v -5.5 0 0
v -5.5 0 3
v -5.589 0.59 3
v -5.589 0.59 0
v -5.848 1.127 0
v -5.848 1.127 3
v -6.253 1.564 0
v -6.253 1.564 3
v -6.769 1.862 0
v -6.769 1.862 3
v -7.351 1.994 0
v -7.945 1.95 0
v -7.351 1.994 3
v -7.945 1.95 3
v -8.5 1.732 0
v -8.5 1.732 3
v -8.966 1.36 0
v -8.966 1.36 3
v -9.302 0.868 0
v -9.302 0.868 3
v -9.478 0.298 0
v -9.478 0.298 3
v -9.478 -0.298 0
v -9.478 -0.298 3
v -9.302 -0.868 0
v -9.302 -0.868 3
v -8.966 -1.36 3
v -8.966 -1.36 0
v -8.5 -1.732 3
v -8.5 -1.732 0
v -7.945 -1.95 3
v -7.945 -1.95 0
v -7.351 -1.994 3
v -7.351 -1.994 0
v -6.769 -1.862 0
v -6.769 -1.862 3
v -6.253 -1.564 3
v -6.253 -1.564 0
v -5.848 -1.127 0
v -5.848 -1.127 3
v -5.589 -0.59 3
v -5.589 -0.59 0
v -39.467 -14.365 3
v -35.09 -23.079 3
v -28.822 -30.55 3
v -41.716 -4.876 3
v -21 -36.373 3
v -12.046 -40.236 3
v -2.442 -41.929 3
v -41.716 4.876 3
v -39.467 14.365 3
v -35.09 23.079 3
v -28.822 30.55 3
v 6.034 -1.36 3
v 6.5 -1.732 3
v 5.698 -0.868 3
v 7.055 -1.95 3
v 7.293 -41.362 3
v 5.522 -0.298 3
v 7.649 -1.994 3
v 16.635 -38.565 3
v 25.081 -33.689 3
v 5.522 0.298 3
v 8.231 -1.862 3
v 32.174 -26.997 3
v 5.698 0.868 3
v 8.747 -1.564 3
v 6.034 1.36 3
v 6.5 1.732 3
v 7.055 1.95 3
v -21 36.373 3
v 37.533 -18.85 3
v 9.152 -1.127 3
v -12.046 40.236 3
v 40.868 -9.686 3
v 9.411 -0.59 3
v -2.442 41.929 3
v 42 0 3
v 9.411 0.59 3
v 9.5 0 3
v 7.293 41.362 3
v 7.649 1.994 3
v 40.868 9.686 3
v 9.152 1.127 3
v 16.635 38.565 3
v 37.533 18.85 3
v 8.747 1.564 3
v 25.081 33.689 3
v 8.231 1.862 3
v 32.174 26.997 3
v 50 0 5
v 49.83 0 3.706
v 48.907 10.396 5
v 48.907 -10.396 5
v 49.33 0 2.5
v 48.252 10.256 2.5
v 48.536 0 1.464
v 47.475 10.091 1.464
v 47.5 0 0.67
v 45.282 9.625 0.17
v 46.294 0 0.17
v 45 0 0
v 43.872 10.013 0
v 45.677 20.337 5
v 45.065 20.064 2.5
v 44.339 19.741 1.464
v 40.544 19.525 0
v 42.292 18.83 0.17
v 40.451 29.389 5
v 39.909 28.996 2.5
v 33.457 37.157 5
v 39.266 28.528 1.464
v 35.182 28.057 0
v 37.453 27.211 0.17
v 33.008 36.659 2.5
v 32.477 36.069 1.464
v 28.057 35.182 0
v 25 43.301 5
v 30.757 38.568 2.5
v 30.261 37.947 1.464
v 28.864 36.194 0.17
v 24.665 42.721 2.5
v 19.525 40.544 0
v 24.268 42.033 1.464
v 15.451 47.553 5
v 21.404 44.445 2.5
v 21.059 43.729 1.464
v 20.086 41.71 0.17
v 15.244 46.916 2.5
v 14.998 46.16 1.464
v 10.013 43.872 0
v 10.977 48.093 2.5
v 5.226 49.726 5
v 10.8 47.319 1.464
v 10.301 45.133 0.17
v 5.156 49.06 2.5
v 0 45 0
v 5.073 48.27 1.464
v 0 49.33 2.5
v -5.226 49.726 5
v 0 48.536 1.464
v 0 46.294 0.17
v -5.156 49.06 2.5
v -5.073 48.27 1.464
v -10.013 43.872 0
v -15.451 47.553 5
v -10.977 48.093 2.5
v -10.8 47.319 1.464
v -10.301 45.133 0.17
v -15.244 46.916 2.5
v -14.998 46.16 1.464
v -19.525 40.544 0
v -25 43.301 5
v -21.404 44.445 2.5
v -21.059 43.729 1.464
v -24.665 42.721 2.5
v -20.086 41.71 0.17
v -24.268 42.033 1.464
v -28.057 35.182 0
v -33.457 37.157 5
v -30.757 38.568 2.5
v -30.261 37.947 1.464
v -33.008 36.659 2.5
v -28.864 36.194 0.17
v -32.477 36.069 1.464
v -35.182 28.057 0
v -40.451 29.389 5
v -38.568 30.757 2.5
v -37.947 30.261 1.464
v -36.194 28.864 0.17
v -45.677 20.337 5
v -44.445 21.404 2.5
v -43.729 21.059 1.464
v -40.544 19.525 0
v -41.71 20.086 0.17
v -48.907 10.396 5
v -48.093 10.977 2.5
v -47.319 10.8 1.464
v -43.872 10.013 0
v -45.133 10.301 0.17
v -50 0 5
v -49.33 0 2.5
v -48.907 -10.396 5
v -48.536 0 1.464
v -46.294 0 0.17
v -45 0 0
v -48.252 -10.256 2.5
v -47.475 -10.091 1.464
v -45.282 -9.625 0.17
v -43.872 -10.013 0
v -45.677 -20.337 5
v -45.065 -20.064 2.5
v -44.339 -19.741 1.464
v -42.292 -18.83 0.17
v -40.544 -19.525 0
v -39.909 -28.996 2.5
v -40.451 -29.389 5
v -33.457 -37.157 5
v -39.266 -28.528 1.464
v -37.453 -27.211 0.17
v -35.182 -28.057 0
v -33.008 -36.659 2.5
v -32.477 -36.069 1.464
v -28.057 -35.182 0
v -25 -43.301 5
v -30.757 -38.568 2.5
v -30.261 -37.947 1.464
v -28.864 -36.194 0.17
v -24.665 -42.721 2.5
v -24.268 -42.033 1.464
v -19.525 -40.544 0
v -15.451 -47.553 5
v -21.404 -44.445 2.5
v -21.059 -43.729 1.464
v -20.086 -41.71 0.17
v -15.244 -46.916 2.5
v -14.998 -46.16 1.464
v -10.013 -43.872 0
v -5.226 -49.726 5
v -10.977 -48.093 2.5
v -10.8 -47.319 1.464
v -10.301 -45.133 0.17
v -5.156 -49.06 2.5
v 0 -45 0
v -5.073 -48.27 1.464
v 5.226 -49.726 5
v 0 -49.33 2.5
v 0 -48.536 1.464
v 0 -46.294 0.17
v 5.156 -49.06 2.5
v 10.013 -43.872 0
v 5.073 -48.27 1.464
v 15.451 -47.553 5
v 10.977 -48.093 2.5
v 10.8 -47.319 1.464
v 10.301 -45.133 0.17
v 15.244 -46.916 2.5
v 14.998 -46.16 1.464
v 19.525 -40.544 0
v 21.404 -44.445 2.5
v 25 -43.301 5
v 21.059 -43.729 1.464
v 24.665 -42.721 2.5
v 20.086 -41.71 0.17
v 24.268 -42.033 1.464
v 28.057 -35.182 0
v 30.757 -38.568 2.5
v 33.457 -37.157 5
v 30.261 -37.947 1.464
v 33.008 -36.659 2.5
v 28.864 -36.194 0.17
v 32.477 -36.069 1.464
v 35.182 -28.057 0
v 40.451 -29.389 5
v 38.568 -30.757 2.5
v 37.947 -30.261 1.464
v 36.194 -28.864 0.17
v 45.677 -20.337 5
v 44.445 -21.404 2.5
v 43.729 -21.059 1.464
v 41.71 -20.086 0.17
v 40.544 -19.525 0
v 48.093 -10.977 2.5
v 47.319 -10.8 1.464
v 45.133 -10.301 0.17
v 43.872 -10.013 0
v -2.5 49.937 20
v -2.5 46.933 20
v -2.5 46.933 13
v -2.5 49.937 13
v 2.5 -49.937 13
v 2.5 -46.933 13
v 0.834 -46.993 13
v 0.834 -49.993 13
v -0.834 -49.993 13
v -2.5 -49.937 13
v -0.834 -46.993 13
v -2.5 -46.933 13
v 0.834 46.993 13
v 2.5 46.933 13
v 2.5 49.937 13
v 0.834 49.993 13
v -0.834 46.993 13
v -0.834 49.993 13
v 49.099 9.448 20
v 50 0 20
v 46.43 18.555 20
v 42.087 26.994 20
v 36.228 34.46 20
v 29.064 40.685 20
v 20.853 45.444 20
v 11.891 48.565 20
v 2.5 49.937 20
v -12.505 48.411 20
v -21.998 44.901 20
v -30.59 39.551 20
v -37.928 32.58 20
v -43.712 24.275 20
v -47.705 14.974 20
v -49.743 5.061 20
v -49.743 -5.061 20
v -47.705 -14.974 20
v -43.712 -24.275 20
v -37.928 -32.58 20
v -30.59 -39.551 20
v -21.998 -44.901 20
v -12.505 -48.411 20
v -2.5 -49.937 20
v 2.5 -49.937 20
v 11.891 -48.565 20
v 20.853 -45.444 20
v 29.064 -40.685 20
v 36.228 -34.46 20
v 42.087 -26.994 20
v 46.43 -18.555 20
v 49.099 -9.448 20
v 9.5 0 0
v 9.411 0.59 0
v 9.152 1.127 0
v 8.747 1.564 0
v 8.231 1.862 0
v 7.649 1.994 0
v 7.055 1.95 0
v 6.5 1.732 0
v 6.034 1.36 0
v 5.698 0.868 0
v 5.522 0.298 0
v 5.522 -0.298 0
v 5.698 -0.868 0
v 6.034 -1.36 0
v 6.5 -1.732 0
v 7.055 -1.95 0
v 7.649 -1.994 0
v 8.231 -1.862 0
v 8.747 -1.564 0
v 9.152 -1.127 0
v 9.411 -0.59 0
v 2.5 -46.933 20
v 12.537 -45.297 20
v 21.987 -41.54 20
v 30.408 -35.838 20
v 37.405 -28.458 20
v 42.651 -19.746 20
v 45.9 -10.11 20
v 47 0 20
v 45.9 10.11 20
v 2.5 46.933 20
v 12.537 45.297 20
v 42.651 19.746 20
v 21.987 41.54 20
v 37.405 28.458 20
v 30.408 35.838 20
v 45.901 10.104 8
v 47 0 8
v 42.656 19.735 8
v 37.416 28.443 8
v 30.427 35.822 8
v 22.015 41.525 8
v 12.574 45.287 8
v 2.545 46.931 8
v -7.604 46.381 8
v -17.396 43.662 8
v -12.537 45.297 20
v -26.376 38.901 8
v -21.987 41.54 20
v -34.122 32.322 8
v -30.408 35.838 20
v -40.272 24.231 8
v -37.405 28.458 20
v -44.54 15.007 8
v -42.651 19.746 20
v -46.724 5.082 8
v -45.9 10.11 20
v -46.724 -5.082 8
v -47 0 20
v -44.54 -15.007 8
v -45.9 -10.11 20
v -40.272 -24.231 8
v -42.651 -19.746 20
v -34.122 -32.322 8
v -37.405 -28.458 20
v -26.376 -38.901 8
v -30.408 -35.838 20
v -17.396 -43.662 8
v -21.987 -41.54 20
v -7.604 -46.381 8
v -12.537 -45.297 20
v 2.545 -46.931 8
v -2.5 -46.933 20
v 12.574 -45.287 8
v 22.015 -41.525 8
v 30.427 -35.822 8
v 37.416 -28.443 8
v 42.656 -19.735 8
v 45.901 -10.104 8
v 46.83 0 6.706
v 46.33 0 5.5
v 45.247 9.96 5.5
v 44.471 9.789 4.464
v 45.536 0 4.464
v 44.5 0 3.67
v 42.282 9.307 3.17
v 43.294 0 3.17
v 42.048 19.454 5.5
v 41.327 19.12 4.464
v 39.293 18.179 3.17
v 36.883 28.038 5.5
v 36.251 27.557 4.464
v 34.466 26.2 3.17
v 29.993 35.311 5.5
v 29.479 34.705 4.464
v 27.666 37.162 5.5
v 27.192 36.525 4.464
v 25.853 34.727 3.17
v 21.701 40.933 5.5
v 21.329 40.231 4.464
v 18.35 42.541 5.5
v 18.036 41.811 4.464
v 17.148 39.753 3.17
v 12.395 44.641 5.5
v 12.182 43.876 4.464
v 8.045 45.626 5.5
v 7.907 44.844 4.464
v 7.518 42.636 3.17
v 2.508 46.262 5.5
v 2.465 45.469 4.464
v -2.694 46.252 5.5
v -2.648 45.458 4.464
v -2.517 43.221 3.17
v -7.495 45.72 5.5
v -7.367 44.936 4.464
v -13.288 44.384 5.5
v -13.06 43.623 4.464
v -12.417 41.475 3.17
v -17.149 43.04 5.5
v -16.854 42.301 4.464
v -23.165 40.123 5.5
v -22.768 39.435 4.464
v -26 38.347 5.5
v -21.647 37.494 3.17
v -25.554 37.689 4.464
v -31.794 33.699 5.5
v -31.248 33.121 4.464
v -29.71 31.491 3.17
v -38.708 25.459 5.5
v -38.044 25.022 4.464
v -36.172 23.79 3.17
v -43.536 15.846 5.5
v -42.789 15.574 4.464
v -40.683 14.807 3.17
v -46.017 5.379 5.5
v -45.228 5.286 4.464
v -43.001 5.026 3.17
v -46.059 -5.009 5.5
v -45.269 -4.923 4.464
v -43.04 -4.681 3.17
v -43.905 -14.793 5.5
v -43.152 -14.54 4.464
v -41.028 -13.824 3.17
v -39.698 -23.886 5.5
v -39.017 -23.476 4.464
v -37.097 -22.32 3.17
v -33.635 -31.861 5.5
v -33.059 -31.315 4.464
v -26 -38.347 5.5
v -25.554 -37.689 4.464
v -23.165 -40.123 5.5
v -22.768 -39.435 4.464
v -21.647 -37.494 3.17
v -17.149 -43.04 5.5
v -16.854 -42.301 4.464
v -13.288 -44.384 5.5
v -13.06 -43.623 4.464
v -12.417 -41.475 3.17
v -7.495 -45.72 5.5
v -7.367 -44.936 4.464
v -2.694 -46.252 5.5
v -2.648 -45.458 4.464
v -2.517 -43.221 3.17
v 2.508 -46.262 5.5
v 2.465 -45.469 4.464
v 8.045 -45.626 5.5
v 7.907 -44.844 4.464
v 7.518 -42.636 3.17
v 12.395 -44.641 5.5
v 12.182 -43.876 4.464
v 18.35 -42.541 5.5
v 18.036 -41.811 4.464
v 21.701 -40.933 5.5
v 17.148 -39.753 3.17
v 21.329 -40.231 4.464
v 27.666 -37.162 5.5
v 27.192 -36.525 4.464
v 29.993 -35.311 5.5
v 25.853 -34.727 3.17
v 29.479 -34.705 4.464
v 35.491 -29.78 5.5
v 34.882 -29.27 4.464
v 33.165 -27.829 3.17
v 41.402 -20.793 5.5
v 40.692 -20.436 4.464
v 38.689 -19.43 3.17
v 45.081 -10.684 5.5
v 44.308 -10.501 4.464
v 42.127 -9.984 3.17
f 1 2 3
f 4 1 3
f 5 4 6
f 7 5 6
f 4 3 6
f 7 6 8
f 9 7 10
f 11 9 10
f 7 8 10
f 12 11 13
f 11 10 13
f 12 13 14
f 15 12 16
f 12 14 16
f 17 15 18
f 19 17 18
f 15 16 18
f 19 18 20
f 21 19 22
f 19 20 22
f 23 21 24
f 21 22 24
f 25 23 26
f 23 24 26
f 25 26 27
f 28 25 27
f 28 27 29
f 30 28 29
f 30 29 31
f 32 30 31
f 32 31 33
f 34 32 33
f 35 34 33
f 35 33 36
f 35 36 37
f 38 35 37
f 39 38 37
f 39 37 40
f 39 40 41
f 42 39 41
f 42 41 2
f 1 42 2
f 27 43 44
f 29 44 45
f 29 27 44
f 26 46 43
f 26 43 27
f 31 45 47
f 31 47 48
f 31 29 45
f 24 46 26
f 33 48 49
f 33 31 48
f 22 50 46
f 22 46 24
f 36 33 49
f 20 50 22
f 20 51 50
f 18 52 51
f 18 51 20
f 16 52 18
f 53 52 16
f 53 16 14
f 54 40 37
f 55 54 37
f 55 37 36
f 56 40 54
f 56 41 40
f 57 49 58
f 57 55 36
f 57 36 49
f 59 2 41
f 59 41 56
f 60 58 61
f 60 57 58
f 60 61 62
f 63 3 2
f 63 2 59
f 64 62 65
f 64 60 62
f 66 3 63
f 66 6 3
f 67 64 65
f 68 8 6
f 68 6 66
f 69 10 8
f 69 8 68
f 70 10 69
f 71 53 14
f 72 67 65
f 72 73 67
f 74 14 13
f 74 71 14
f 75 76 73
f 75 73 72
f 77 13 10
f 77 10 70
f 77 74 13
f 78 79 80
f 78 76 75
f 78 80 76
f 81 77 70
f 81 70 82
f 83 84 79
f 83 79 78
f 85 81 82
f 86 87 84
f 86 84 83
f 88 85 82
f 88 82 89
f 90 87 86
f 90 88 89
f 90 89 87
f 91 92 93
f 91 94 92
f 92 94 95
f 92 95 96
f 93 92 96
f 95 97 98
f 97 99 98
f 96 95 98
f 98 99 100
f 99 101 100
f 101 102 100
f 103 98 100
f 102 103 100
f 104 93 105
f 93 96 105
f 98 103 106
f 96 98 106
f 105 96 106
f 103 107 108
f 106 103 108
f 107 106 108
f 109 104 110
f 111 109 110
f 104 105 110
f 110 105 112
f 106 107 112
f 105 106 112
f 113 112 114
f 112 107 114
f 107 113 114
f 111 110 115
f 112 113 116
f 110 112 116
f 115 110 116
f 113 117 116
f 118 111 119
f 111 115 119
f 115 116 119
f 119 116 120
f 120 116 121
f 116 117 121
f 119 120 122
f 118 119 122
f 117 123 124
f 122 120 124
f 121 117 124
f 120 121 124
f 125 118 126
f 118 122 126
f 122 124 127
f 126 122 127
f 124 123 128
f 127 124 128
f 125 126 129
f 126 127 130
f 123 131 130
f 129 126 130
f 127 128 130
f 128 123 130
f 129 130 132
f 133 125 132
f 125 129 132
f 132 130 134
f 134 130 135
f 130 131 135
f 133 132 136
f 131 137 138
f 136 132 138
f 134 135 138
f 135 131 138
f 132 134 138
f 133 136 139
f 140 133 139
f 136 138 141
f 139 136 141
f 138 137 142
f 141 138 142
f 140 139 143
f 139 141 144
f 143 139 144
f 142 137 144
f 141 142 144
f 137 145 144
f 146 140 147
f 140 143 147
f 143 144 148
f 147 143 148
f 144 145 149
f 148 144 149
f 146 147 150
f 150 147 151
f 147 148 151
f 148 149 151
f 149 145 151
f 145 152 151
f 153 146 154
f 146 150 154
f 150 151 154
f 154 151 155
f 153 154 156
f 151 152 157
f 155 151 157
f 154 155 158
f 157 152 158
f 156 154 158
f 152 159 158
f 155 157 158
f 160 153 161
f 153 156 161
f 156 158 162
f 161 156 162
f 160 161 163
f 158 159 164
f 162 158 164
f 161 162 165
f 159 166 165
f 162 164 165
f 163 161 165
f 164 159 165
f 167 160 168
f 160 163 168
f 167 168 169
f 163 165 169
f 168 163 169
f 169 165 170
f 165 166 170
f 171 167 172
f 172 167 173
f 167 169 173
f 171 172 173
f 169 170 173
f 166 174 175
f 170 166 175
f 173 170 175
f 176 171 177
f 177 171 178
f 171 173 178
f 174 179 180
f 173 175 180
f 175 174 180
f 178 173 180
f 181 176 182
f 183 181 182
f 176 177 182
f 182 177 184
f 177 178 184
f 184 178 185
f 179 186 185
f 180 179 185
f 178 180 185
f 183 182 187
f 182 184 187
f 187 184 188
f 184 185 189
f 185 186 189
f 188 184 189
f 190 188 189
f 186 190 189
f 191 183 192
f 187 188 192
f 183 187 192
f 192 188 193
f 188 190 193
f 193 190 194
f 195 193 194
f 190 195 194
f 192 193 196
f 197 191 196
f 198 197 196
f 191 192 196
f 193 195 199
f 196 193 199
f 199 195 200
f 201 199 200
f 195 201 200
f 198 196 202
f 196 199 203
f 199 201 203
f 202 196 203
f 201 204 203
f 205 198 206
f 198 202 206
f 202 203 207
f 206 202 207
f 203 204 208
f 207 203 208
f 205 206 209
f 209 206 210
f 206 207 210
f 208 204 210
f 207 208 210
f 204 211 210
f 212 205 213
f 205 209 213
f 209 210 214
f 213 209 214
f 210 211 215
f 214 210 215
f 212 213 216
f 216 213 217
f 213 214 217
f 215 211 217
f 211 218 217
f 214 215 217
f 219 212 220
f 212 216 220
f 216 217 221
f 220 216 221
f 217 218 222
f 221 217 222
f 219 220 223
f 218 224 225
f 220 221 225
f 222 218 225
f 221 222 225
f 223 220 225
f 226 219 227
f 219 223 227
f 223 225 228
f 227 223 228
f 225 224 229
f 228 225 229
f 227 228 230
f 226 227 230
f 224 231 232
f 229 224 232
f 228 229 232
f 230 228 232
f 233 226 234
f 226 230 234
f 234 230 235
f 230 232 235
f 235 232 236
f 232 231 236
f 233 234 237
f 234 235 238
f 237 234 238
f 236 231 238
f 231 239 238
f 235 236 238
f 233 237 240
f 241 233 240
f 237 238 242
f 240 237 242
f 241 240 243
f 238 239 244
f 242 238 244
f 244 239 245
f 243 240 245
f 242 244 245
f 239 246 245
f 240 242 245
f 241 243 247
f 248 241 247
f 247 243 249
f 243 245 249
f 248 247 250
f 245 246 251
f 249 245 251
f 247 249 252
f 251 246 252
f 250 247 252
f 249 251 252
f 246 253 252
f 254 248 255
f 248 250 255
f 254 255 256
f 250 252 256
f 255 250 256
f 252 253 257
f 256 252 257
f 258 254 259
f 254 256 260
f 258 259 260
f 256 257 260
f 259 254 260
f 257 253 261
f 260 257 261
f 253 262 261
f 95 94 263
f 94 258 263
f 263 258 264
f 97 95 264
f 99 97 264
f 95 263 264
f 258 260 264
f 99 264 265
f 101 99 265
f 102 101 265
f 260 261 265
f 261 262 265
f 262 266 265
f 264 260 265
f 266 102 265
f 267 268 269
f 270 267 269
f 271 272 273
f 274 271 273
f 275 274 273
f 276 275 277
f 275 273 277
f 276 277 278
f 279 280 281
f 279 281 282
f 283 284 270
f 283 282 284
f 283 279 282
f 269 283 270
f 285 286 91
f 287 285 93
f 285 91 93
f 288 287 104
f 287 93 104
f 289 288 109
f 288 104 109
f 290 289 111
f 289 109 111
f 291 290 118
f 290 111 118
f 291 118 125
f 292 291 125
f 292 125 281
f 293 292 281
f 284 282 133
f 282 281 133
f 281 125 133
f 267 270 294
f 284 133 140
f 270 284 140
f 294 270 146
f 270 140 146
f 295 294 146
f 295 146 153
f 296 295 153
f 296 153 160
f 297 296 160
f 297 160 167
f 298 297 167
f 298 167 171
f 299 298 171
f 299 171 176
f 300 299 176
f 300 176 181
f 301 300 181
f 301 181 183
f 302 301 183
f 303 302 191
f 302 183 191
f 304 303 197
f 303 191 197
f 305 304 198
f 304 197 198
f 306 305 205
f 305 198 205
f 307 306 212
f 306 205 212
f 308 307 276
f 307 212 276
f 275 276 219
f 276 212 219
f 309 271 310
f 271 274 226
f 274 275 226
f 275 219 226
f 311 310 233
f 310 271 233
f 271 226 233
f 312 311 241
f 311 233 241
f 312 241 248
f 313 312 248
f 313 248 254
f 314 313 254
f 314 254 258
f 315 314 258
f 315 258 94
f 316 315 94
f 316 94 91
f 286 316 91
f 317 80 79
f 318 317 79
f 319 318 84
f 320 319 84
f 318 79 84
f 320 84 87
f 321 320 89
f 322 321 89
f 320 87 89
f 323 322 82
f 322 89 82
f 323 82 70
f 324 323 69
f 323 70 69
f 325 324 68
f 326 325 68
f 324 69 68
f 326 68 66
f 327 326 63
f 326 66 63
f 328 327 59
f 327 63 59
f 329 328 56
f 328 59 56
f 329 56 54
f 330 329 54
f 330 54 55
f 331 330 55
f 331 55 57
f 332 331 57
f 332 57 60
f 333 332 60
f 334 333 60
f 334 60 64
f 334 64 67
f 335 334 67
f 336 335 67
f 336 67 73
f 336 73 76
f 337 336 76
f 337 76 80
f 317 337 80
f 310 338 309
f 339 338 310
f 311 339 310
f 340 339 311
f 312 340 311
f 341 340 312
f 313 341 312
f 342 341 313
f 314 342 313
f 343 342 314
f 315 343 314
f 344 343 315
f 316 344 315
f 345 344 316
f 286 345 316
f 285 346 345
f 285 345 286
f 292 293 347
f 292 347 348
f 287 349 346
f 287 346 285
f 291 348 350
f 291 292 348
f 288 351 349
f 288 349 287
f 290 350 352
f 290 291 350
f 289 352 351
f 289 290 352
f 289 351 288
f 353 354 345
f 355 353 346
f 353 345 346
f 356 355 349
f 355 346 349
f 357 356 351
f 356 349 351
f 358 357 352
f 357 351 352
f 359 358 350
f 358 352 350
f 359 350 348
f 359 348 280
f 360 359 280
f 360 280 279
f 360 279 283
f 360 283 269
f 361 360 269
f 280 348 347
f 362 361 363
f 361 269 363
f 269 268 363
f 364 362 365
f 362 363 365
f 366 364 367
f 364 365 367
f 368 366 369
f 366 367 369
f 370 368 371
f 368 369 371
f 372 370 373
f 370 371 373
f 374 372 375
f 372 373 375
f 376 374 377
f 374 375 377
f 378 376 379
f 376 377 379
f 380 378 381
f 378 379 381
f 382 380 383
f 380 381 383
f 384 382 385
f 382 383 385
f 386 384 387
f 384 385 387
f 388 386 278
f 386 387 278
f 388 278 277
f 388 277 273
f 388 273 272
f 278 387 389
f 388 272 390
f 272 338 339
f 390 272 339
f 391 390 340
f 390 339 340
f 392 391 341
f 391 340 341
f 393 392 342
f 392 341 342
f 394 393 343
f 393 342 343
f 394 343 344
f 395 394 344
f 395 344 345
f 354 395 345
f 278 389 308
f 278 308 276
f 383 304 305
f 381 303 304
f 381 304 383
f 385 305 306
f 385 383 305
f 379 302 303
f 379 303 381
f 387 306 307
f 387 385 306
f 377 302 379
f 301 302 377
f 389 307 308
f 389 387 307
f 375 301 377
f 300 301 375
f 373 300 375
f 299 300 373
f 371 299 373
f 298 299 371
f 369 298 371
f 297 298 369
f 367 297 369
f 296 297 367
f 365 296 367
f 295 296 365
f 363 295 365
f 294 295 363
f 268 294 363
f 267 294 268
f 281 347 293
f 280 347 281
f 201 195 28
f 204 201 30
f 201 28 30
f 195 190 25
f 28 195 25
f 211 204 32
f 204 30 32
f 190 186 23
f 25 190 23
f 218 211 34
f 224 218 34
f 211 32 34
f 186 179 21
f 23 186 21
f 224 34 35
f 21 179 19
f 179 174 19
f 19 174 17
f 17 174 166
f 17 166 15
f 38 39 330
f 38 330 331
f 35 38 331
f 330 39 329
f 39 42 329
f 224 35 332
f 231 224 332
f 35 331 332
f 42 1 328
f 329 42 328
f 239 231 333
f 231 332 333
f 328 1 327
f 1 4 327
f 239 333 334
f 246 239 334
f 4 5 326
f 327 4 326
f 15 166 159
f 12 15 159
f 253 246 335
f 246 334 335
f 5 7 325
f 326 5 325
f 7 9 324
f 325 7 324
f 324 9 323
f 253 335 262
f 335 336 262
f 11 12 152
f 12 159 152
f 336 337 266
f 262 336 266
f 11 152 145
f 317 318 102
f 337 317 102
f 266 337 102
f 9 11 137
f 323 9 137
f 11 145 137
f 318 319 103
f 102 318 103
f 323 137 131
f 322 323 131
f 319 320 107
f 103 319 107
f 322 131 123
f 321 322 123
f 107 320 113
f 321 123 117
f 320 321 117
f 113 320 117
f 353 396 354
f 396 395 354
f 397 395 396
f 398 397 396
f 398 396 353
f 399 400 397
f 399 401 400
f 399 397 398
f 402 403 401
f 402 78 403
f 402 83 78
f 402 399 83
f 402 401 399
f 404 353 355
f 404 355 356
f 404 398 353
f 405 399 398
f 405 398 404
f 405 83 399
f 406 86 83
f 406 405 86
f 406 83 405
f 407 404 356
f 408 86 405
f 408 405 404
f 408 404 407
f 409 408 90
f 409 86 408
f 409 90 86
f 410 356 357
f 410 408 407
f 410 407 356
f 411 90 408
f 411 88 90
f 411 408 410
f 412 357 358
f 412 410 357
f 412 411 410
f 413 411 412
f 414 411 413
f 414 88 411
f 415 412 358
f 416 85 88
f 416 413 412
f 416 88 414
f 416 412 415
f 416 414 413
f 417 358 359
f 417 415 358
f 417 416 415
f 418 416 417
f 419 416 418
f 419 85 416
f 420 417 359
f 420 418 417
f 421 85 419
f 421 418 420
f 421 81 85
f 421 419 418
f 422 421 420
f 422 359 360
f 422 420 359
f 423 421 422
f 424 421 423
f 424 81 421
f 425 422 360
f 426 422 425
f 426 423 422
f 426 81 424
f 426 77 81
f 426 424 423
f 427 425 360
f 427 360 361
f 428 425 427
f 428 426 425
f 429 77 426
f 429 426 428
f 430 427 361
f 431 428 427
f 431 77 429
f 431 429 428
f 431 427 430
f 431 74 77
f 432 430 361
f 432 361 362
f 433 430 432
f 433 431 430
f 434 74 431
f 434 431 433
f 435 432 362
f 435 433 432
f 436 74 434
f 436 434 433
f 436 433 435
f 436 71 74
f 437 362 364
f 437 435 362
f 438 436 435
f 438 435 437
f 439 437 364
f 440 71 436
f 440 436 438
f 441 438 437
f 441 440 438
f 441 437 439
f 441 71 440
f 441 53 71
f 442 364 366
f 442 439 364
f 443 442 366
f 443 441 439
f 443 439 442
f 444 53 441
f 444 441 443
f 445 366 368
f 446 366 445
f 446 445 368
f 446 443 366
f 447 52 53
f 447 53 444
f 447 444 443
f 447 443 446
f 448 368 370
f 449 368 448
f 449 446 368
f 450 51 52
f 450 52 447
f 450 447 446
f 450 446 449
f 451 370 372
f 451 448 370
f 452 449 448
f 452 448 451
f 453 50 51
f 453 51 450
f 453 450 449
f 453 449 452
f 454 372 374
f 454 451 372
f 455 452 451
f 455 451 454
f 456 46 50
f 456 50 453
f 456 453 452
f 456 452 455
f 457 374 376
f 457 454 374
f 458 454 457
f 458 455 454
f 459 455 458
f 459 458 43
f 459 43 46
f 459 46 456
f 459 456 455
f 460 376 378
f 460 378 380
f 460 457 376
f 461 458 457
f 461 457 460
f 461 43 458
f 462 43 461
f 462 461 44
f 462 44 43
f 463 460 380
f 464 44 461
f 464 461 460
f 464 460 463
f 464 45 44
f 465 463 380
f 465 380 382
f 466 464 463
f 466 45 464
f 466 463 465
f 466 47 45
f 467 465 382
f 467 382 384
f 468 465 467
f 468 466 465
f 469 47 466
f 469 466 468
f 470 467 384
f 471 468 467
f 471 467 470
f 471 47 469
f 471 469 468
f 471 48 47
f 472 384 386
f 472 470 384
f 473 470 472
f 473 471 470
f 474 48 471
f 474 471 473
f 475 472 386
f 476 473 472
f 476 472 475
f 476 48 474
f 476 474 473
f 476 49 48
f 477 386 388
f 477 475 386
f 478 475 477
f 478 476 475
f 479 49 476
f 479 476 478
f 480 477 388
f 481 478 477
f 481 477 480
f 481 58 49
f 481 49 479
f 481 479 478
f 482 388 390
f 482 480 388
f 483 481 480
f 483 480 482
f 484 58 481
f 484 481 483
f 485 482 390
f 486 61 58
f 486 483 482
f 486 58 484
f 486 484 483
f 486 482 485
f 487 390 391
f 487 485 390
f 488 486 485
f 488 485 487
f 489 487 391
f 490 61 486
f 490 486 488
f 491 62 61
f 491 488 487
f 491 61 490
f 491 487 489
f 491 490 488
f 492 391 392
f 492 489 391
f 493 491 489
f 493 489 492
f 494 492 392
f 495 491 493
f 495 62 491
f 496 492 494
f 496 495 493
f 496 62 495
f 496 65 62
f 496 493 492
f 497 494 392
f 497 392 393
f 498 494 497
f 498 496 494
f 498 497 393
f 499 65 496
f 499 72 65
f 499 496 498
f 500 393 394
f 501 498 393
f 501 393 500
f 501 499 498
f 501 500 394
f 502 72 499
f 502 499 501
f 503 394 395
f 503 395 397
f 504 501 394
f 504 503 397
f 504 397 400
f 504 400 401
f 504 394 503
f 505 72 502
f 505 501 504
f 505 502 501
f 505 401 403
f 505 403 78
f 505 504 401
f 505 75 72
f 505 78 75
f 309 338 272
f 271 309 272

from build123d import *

# Parameters (mm, degrees)
SKETCH_R             = 50
PAD_DEPTH            = 20
FILLET_R             = 5
SKETCH001_R          = 47
POCKET_DEPTH         = 17
FILLET001_R          = 5
SKETCH002_R          = 2
POCKET001_DEPTH      = 5
SKETCH003_W          = 7
SKETCH003_H          = 5
POCKET002_DEPTH      = 50.001
POCKET002_DEPTH_BACK = -50.001


with BuildPart() as part:
    # Sketch → Pad (new body)
    with BuildSketch(Plane.XY):
        Circle(SKETCH_R)
    extrude(amount=PAD_DEPTH)

    # Fillet
    fillet_edges = [part.edges().sort_by_distance(p)[0] for p in [
        (-50, 0, 0),
    ]]
    fillet(fillet_edges, radius=FILLET_R)

    # Sketch001 (on Face3 of Fillet) → Pocket (cut)
    with BuildSketch(Plane.XY.offset(20)):
        Circle(SKETCH001_R)
    extrude(amount=-POCKET_DEPTH, mode=Mode.SUBTRACT)

    # Fillet001
    fillet001_edges = [part.edges().sort_by_distance(p)[0] for p in [
        (-47, 0, 3),
    ]]
    fillet(fillet001_edges, radius=FILLET001_R)

    # Sketch002 (on Face4 of Fillet001) → Pocket001 (cut)
    with BuildSketch(Plane.XY.offset(3)):
        with Locations((-7.5, 0)):
            Circle(SKETCH002_R)
        with Locations((7.5, 0)):
            Circle(SKETCH002_R)
    extrude(amount=-POCKET001_DEPTH, mode=Mode.SUBTRACT)

    # Sketch003 (on DatumPlane) → Pocket002 (cut, two sides)
    with BuildSketch(Plane(origin=(0, 0, 5), x_dir=(0, 0, -1), z_dir=(0, 1, 0))) as pocket002_sk:
        with Locations((-11.5, 0)):
            Rectangle(SKETCH003_W, SKETCH003_H)
    extrude(amount=-POCKET002_DEPTH, mode=Mode.SUBTRACT)
    extrude(pocket002_sk.sketch, amount=-POCKET002_DEPTH_BACK, mode=Mode.SUBTRACT)


solid = part.part
